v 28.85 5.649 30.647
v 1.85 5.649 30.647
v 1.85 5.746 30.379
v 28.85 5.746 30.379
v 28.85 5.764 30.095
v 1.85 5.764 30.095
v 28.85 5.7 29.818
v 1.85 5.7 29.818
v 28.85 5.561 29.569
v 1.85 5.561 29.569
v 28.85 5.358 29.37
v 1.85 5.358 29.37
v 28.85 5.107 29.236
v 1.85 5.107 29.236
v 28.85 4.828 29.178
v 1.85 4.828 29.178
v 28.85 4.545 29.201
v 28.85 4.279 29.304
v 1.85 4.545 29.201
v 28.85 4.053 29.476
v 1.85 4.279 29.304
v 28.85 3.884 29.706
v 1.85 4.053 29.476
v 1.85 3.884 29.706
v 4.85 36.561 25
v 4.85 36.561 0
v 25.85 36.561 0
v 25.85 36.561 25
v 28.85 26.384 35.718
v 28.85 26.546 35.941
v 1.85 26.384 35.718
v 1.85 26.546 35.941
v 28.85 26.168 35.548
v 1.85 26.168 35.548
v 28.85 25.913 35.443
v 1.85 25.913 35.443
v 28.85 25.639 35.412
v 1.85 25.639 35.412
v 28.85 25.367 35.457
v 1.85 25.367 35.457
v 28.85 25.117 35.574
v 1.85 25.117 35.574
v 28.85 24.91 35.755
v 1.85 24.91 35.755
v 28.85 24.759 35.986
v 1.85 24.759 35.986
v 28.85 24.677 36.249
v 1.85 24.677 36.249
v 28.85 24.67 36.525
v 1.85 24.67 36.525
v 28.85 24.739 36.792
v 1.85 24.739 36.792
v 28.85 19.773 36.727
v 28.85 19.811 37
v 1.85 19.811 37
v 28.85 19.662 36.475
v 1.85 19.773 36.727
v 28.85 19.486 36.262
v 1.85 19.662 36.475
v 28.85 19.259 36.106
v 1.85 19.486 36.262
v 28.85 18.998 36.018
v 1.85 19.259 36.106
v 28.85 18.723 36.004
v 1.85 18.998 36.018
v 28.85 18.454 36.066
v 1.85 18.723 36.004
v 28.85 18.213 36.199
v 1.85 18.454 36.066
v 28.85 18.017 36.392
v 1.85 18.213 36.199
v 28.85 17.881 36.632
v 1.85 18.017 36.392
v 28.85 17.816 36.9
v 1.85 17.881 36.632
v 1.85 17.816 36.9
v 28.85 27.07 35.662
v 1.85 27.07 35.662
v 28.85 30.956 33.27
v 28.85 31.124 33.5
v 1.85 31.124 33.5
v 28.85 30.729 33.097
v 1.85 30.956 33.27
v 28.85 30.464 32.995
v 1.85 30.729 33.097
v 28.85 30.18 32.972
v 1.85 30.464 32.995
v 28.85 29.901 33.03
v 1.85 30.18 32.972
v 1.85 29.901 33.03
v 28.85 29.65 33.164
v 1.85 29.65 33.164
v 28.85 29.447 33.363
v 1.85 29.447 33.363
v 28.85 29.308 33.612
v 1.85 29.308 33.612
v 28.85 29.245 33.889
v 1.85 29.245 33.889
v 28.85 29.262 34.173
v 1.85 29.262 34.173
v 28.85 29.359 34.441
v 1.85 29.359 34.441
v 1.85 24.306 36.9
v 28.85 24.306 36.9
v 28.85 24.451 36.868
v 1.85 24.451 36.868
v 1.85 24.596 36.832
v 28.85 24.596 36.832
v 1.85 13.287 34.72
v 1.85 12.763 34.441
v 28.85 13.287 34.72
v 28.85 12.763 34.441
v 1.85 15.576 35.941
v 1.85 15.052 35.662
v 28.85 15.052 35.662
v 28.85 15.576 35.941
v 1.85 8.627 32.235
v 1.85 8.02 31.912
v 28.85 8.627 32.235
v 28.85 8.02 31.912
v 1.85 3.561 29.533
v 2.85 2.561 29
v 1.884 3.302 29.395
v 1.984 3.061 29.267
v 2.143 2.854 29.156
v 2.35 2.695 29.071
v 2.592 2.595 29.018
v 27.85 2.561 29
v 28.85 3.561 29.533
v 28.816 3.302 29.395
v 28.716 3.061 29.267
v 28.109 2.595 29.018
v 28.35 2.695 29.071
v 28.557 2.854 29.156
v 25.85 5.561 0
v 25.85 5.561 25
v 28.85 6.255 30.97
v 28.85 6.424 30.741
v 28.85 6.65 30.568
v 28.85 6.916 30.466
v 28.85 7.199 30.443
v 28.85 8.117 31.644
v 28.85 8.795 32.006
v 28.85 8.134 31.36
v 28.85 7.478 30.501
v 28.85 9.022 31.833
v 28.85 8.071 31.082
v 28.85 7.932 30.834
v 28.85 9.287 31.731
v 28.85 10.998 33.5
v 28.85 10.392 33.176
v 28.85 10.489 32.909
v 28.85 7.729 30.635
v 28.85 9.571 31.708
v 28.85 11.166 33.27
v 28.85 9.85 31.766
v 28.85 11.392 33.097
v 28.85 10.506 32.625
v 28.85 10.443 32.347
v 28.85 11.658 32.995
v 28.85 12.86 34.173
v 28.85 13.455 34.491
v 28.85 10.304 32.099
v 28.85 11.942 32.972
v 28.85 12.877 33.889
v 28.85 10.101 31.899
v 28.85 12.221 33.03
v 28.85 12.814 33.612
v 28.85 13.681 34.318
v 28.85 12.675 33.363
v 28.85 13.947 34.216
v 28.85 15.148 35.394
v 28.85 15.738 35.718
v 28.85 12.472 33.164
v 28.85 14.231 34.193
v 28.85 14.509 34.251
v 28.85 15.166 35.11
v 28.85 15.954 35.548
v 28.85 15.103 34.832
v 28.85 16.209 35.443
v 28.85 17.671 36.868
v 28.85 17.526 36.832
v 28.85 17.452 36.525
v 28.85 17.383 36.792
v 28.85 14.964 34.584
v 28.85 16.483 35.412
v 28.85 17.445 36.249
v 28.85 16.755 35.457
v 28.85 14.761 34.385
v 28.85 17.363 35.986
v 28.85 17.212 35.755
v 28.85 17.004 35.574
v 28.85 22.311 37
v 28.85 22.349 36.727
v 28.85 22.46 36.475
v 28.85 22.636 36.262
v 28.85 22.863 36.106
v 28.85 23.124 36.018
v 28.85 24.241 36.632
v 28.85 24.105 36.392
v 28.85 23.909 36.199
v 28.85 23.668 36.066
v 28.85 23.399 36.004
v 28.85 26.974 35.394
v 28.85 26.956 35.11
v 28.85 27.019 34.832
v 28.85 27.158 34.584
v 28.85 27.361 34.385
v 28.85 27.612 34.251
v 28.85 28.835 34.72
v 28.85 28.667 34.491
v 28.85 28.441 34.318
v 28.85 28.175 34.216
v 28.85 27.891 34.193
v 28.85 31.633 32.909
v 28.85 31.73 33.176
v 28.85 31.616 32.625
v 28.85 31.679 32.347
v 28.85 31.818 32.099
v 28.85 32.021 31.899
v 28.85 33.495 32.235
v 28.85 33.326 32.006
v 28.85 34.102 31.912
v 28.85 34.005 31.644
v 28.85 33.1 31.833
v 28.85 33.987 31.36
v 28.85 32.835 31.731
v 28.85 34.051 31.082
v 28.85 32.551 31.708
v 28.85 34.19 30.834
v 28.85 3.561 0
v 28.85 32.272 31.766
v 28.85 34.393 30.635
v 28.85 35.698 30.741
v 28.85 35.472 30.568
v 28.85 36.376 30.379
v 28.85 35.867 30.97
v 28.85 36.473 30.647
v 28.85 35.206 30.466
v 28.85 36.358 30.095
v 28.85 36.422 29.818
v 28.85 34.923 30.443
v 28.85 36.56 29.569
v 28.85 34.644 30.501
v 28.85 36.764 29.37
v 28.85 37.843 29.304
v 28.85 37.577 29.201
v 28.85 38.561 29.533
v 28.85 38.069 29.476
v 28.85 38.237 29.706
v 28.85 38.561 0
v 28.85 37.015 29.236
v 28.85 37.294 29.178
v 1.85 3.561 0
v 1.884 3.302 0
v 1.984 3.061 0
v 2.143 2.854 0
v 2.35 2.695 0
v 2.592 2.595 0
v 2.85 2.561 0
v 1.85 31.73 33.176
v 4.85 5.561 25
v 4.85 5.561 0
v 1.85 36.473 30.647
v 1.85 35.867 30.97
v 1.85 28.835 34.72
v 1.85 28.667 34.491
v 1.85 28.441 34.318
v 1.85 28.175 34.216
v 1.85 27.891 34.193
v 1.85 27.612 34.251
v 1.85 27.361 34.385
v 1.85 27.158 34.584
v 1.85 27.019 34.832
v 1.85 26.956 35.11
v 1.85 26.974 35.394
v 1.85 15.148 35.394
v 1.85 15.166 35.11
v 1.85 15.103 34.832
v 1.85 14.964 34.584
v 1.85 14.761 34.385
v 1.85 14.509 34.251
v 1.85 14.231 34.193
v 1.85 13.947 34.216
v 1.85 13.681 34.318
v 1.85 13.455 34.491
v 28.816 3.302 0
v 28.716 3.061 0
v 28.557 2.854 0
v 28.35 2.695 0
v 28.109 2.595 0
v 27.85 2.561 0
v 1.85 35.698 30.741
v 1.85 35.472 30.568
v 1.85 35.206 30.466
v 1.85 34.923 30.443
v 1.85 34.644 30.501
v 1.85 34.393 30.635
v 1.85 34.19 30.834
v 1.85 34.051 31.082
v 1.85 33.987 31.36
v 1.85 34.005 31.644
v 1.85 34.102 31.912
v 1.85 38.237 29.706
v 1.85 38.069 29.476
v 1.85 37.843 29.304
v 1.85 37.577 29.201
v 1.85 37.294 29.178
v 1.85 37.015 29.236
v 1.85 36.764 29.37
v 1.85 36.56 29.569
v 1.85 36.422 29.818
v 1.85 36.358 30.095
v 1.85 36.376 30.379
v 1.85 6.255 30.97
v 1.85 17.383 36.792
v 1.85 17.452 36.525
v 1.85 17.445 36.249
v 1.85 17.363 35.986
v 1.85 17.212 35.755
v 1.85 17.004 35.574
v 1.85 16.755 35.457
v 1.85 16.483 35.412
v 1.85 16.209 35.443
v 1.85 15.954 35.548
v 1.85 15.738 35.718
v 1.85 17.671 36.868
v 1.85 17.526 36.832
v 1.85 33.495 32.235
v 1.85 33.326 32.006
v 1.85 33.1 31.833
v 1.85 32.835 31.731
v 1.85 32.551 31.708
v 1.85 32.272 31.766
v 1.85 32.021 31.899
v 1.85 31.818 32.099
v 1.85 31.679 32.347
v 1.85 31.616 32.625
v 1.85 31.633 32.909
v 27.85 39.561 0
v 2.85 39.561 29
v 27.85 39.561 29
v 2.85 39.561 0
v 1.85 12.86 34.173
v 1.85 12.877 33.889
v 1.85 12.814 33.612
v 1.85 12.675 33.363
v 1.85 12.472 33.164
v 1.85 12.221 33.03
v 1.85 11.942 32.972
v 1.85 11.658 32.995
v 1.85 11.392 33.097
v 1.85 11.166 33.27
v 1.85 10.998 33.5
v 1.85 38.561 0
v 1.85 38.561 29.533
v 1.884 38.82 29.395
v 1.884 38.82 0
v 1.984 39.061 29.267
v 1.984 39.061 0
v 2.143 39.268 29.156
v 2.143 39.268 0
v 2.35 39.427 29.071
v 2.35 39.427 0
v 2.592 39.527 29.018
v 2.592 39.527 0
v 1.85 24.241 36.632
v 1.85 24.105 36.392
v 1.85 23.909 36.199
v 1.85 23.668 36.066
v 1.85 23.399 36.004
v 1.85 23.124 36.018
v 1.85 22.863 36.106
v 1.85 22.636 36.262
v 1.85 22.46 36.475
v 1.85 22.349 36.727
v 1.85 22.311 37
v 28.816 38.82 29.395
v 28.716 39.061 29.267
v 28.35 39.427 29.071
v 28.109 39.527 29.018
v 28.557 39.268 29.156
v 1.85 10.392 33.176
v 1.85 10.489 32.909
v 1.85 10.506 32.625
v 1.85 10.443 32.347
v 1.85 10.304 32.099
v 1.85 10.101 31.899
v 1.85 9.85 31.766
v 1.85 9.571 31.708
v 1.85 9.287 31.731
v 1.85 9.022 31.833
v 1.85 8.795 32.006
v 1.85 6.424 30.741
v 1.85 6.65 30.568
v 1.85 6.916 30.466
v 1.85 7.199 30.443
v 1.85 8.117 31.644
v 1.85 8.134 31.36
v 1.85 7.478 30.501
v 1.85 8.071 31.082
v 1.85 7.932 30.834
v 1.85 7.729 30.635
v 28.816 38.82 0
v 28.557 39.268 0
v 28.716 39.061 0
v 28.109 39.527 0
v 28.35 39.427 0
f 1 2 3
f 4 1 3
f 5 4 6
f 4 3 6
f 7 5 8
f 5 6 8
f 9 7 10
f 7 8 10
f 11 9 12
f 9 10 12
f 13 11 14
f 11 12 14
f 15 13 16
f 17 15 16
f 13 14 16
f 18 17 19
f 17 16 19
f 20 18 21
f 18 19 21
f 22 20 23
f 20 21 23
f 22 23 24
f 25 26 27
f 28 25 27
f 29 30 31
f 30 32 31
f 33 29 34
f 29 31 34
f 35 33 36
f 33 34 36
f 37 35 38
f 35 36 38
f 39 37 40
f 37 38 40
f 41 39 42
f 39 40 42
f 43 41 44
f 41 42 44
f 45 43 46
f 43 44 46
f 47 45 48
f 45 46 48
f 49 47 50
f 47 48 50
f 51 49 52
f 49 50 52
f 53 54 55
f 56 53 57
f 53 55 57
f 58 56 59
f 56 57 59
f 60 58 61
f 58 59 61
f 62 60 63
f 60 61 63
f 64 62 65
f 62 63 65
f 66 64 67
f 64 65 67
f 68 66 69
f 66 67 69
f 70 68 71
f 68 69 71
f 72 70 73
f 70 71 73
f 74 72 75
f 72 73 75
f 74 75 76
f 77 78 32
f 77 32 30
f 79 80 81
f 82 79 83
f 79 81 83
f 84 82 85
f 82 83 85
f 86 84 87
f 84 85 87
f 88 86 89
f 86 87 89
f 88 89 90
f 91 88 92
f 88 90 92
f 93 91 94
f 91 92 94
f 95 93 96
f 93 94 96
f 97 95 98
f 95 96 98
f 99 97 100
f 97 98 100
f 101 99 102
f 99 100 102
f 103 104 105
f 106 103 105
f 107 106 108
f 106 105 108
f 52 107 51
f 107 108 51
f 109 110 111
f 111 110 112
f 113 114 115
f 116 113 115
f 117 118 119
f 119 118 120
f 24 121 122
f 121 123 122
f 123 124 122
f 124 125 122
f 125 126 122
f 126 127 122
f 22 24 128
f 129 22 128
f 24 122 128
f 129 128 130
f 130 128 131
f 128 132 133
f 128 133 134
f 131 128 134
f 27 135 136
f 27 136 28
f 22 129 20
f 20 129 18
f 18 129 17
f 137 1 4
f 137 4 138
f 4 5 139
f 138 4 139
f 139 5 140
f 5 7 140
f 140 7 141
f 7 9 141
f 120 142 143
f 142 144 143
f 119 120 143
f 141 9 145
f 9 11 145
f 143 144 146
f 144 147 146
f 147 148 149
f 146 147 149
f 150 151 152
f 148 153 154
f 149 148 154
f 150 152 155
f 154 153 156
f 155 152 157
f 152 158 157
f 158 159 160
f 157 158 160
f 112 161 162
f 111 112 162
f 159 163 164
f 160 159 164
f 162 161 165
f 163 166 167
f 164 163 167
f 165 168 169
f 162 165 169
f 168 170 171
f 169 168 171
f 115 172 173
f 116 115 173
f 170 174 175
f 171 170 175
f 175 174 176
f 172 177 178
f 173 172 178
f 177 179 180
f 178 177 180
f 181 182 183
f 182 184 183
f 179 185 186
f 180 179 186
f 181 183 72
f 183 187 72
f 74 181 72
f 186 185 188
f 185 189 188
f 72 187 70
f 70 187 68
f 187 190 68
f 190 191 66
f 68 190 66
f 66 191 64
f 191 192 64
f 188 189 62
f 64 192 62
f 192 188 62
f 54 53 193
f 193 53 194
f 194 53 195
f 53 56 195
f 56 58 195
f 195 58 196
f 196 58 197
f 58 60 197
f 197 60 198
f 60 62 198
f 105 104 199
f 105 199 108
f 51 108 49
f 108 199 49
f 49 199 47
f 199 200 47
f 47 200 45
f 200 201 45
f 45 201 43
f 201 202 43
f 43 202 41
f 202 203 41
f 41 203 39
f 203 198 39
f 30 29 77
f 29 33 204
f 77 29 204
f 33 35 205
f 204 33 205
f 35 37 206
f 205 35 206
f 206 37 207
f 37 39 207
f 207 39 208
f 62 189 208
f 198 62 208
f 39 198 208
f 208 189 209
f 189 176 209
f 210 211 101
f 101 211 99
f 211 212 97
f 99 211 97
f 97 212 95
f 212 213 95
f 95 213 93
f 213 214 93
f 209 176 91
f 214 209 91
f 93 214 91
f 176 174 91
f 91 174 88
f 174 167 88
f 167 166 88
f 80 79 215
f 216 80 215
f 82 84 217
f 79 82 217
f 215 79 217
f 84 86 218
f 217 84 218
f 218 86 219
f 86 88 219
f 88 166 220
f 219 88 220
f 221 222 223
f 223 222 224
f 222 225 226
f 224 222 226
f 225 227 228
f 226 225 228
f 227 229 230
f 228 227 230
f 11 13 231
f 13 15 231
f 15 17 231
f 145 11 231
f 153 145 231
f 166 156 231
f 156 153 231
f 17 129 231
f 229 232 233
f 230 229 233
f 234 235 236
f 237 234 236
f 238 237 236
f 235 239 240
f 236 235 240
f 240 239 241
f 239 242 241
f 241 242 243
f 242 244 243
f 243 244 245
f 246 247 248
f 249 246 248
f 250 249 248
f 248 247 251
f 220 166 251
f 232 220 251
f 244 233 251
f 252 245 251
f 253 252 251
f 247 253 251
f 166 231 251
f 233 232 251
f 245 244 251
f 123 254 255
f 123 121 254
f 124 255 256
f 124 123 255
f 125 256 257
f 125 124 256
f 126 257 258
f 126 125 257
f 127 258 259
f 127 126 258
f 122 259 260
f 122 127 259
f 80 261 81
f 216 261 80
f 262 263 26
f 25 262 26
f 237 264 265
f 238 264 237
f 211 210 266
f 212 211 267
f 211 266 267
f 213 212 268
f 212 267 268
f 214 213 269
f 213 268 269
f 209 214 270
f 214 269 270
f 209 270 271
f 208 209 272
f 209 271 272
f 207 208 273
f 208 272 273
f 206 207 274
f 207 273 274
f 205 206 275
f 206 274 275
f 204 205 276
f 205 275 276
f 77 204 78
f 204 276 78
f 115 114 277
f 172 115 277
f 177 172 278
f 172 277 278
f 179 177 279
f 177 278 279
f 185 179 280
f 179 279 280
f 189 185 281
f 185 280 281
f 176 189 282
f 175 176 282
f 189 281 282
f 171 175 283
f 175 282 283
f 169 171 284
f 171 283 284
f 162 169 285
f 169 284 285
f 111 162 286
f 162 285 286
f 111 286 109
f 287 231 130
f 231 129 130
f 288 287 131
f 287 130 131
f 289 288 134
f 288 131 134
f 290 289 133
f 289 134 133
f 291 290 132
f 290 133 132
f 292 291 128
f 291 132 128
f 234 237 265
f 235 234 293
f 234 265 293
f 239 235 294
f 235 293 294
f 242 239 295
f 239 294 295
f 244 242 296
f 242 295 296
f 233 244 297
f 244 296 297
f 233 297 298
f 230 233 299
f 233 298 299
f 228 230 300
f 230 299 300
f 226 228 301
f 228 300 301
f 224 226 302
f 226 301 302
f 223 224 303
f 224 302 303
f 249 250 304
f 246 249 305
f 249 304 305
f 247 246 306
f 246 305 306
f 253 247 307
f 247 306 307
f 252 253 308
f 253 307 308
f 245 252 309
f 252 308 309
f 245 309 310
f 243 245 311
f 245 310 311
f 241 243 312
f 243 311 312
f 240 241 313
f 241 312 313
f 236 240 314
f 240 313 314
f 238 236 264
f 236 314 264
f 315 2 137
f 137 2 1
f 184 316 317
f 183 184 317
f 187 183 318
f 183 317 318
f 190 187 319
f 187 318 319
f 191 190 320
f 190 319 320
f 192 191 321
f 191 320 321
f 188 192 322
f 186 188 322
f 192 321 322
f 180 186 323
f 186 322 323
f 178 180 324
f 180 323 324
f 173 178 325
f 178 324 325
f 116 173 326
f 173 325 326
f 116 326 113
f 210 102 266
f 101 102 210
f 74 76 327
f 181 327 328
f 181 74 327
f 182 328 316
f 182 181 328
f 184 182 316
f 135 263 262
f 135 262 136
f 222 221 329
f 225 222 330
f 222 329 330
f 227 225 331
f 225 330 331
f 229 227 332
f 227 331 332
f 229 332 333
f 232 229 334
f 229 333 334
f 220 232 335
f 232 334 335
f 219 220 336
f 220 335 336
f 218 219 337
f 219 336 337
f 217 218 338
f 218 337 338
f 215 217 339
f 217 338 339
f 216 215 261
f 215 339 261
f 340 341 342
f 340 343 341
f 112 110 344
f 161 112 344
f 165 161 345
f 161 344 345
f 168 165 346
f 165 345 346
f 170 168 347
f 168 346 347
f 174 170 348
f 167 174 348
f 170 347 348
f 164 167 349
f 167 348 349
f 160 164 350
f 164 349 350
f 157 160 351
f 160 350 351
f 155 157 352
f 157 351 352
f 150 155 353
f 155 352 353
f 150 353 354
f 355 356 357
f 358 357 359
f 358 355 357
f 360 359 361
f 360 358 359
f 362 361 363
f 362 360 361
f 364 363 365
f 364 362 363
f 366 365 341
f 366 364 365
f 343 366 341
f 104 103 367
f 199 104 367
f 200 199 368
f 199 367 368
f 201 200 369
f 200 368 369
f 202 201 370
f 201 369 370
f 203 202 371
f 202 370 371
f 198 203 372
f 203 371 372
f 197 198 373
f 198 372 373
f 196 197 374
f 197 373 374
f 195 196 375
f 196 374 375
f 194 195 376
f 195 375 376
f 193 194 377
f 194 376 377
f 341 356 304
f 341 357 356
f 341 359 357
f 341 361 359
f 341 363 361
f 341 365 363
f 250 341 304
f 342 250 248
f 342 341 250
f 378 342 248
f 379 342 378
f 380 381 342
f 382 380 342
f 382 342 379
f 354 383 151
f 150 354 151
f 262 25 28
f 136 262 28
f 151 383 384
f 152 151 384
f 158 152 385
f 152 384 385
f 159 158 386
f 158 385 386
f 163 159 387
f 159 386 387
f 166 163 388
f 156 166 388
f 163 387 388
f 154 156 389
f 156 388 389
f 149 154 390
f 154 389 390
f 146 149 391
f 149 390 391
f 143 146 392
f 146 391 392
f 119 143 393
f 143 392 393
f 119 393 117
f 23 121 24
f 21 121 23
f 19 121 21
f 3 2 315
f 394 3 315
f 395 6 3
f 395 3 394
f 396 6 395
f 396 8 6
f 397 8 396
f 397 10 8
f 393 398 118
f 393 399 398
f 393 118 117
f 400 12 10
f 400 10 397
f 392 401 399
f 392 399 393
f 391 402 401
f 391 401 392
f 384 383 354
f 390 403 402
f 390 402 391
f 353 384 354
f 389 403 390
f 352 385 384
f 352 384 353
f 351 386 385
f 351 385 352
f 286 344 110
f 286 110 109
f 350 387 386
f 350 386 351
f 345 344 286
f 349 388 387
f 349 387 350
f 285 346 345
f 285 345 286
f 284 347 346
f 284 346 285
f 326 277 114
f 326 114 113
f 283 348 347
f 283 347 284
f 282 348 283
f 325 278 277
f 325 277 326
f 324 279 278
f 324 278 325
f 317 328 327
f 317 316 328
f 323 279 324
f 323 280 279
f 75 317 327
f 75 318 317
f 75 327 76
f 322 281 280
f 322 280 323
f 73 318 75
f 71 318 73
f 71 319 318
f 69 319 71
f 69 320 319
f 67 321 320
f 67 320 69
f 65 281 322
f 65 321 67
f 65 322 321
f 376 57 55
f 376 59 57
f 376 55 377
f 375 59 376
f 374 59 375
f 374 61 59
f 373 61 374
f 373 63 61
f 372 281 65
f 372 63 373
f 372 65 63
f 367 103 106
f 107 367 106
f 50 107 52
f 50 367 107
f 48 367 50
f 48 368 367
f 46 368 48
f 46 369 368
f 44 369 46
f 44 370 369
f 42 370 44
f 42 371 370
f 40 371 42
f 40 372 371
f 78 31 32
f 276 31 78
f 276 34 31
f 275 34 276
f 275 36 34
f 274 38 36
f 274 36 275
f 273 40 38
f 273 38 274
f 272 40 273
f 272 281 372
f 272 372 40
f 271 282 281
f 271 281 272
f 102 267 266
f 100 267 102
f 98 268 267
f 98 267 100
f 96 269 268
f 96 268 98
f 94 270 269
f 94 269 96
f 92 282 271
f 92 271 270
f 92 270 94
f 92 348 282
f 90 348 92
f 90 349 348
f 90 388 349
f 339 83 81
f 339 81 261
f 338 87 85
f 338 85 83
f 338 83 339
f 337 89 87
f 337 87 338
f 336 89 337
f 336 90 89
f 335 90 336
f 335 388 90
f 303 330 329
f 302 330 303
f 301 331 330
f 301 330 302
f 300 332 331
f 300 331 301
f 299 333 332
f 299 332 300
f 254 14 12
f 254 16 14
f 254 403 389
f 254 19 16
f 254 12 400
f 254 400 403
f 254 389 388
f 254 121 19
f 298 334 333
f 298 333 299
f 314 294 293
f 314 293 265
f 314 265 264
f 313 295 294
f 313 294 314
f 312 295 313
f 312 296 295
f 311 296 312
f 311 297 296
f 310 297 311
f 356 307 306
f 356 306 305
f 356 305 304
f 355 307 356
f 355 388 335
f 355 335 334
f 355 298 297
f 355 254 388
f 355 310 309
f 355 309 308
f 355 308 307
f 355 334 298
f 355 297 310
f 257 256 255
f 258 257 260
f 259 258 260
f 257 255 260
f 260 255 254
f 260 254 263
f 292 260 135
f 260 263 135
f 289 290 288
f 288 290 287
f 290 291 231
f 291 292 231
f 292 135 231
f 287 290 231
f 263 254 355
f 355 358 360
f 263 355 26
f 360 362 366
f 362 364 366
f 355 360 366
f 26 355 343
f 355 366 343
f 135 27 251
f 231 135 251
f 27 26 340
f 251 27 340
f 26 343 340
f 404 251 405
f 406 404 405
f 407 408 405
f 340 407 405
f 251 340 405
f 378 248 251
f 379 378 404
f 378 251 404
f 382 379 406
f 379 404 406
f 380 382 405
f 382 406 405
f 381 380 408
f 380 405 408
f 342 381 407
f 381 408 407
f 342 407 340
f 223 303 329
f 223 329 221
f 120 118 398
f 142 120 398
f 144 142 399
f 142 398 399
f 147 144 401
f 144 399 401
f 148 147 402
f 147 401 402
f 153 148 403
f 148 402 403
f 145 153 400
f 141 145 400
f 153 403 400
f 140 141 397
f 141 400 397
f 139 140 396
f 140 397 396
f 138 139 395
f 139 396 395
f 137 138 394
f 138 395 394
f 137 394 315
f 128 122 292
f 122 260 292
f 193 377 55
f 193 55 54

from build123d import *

# Parameters (mm, degrees)
F0_W     = 27
F0_H     = 37
F0_W_2   = 21
F0_H_2   = 31
F1_DEPTH = 25
F2_W     = 27
F2_H     = 37
F3_DEPTH = 12
F4_SIZE2 = 8
F4_SIZE  = 15
F5_R     = 5
F6_R     = 1
F7_DEPTH = 27.001
F8_R     = 1


with BuildPart() as f1:
    # F0 (on Top) → F1 (new body)
    with BuildSketch(Plane.XY):
        with Locations((15.3503448237, 21.0609438564)):
            Rectangle(F0_W, F0_H)
        with Locations((15.3503448237, 21.0609438564)):
            Rectangle(F0_W_2, F0_H_2, mode=Mode.SUBTRACT)
    extrude(amount=F1_DEPTH)

    # F2 (on face) → F3 (join)
    with BuildSketch(Plane.XY.offset(25)):
        with Locations((15.3503448237, 21.0609438564)):
            Rectangle(F2_W, F2_H)
    extrude(amount=F3_DEPTH)

    # F4
    f4_edges = [f1.edges().sort_by_distance(p)[0] for p in [
        (15.350345, 39.560944, 37),
        (15.350345, 2.560944, 37),
    ]]
    f4_side = f1.faces().sort_by_distance((15.350345, 21.060944, 37))[0]
    chamfer(f4_edges, length=F4_SIZE, length2=F4_SIZE2, reference=f4_side)

    # F5
    f5_edges = [f1.edges().sort_by_distance(p)[0] for p in [
        (15.350345, 24.560944, 37),
        (15.350345, 17.560944, 37),
    ]]
    fillet(f5_edges, radius=F5_R)

    # F6 (on face) → F7 (cut, through all)
    with BuildSketch(Plane(origin=(1.8503448237, 0, 0), x_dir=(0, -1, 0), z_dir=(-1, 0, 0))):
        with Locations((-32.6124144447, 32.7058823529)):
            Circle(F6_R)
        with Locations((-9.5094732682, 32.7058823529)):
            Circle(F6_R)
        with Locations((-25.6638850329, 36.4117647059)):
            Circle(F6_R)
        with Locations((-16.45800268, 36.4117647059)):
            Circle(F6_R)
        with Locations((-30.2415320917, 33.9703529412)):
            Circle(F6_R)
        with Locations((-11.8803556211, 33.9703529412)):
            Circle(F6_R)
        with Locations((-18.8109438564, 37)):
            Circle(F6_R)
        with Locations((-23.3109438564, 37)):
            Circle(F6_R)
        with Locations((-4.7668262094, 30.1764705882)):
            Circle(F6_R)
        with Locations((-37.3550615035, 30.1764705882)):
            Circle(F6_R)
        with Locations((-7.1377085623, 31.4409411765)):
            Circle(F6_R)
        with Locations((-34.9841791505, 31.4409411765)):
            Circle(F6_R)
        with Locations((-27.9527085623, 35.1910588235)):
            Circle(F6_R)
        with Locations((-14.1691791505, 35.1910588235)):
            Circle(F6_R)
    extrude(amount=-F7_DEPTH, mode=Mode.SUBTRACT)

    # F8
    f8_edges = [f1.edges().sort_by_distance(p)[0] for p in [
        (28.850345, 39.560944, 14.5),
        (1.850345, 39.560944, 14.5),
        (28.850345, 2.560944, 14.5),
        (1.850345, 2.560944, 14.5),
    ]]
    fillet(f8_edges, radius=F8_R)


solid = f1.part
